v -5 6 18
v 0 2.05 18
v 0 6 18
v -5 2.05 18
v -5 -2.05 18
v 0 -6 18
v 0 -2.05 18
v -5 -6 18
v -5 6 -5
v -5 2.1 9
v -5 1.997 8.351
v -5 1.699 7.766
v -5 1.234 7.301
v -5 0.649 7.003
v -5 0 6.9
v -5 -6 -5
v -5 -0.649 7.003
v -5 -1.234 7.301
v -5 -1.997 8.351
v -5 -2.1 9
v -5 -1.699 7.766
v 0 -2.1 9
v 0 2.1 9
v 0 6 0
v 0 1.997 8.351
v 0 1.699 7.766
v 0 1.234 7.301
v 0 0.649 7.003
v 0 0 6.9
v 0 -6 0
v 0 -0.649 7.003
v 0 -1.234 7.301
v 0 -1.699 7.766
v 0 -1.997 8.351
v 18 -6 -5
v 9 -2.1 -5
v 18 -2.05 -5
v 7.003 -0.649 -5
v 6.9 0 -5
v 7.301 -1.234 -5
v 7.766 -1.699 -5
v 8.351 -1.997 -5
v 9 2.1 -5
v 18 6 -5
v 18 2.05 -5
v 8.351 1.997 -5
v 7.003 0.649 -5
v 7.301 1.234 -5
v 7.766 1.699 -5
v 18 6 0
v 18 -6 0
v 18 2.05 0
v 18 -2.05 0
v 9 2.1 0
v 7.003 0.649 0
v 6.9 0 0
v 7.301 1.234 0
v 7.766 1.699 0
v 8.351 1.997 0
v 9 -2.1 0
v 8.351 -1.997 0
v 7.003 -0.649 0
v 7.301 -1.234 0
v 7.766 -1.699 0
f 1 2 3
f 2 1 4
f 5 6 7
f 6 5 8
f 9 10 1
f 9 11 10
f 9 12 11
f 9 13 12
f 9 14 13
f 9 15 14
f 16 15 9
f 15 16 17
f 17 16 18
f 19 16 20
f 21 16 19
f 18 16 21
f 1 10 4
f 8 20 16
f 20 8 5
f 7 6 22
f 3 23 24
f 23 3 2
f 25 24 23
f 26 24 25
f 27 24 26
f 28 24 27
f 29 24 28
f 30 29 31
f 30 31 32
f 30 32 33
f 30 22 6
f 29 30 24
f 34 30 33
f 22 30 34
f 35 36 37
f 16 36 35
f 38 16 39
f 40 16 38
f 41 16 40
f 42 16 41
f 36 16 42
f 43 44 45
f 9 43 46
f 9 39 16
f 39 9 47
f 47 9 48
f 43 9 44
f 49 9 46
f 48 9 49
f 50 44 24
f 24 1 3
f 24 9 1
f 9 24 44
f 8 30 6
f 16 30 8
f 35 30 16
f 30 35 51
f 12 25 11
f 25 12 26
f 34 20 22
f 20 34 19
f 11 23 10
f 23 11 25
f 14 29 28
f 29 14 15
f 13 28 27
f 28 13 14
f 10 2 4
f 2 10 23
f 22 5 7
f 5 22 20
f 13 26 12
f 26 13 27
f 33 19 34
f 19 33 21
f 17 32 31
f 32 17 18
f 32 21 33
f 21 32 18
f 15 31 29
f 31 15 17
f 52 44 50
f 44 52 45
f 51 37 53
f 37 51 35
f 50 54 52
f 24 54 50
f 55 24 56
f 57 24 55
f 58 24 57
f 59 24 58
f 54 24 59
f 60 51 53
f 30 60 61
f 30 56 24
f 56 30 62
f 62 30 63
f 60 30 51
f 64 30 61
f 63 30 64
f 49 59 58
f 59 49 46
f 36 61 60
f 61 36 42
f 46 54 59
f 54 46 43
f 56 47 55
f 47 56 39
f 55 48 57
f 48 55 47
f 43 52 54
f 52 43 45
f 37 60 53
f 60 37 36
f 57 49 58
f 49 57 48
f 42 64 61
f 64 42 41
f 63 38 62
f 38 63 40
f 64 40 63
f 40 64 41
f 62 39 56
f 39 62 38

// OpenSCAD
// An L shaped wooden box assembly / screwing helper

assemblyHelper();

module assemblyHelper(plankThickness=18,screwDia=4,wallSize=4,thickness=5){

  height = plankThickness;
  width    = wallSize*2 + screwDia;
  fudge= 0.1;
  
  module side(){
      difference(){
        translate([height/2-thickness/2,0,thickness/2]) cube([height+thickness,width,thickness],center=true);
        
        
        translate([height/2,0,0]) 
          hull(){
            cylinder(r=screwDia/2+fudge,h=thickness+fudge,$fn=20);
            translate([0,-(screwDia+fudge)/2,0])cube([height/2,screwDia+fudge,thickness+fudge]);
          }
      }
  }
  
  rotate([0,-90,0]) union(){
    side();
    rotate([0,90,0]) translate([0,0,-thickness]) side();
    //translate([-thickness-0.1,-width/2,0]) cube([thickness,width,thickness+fudge]);
  }
}
